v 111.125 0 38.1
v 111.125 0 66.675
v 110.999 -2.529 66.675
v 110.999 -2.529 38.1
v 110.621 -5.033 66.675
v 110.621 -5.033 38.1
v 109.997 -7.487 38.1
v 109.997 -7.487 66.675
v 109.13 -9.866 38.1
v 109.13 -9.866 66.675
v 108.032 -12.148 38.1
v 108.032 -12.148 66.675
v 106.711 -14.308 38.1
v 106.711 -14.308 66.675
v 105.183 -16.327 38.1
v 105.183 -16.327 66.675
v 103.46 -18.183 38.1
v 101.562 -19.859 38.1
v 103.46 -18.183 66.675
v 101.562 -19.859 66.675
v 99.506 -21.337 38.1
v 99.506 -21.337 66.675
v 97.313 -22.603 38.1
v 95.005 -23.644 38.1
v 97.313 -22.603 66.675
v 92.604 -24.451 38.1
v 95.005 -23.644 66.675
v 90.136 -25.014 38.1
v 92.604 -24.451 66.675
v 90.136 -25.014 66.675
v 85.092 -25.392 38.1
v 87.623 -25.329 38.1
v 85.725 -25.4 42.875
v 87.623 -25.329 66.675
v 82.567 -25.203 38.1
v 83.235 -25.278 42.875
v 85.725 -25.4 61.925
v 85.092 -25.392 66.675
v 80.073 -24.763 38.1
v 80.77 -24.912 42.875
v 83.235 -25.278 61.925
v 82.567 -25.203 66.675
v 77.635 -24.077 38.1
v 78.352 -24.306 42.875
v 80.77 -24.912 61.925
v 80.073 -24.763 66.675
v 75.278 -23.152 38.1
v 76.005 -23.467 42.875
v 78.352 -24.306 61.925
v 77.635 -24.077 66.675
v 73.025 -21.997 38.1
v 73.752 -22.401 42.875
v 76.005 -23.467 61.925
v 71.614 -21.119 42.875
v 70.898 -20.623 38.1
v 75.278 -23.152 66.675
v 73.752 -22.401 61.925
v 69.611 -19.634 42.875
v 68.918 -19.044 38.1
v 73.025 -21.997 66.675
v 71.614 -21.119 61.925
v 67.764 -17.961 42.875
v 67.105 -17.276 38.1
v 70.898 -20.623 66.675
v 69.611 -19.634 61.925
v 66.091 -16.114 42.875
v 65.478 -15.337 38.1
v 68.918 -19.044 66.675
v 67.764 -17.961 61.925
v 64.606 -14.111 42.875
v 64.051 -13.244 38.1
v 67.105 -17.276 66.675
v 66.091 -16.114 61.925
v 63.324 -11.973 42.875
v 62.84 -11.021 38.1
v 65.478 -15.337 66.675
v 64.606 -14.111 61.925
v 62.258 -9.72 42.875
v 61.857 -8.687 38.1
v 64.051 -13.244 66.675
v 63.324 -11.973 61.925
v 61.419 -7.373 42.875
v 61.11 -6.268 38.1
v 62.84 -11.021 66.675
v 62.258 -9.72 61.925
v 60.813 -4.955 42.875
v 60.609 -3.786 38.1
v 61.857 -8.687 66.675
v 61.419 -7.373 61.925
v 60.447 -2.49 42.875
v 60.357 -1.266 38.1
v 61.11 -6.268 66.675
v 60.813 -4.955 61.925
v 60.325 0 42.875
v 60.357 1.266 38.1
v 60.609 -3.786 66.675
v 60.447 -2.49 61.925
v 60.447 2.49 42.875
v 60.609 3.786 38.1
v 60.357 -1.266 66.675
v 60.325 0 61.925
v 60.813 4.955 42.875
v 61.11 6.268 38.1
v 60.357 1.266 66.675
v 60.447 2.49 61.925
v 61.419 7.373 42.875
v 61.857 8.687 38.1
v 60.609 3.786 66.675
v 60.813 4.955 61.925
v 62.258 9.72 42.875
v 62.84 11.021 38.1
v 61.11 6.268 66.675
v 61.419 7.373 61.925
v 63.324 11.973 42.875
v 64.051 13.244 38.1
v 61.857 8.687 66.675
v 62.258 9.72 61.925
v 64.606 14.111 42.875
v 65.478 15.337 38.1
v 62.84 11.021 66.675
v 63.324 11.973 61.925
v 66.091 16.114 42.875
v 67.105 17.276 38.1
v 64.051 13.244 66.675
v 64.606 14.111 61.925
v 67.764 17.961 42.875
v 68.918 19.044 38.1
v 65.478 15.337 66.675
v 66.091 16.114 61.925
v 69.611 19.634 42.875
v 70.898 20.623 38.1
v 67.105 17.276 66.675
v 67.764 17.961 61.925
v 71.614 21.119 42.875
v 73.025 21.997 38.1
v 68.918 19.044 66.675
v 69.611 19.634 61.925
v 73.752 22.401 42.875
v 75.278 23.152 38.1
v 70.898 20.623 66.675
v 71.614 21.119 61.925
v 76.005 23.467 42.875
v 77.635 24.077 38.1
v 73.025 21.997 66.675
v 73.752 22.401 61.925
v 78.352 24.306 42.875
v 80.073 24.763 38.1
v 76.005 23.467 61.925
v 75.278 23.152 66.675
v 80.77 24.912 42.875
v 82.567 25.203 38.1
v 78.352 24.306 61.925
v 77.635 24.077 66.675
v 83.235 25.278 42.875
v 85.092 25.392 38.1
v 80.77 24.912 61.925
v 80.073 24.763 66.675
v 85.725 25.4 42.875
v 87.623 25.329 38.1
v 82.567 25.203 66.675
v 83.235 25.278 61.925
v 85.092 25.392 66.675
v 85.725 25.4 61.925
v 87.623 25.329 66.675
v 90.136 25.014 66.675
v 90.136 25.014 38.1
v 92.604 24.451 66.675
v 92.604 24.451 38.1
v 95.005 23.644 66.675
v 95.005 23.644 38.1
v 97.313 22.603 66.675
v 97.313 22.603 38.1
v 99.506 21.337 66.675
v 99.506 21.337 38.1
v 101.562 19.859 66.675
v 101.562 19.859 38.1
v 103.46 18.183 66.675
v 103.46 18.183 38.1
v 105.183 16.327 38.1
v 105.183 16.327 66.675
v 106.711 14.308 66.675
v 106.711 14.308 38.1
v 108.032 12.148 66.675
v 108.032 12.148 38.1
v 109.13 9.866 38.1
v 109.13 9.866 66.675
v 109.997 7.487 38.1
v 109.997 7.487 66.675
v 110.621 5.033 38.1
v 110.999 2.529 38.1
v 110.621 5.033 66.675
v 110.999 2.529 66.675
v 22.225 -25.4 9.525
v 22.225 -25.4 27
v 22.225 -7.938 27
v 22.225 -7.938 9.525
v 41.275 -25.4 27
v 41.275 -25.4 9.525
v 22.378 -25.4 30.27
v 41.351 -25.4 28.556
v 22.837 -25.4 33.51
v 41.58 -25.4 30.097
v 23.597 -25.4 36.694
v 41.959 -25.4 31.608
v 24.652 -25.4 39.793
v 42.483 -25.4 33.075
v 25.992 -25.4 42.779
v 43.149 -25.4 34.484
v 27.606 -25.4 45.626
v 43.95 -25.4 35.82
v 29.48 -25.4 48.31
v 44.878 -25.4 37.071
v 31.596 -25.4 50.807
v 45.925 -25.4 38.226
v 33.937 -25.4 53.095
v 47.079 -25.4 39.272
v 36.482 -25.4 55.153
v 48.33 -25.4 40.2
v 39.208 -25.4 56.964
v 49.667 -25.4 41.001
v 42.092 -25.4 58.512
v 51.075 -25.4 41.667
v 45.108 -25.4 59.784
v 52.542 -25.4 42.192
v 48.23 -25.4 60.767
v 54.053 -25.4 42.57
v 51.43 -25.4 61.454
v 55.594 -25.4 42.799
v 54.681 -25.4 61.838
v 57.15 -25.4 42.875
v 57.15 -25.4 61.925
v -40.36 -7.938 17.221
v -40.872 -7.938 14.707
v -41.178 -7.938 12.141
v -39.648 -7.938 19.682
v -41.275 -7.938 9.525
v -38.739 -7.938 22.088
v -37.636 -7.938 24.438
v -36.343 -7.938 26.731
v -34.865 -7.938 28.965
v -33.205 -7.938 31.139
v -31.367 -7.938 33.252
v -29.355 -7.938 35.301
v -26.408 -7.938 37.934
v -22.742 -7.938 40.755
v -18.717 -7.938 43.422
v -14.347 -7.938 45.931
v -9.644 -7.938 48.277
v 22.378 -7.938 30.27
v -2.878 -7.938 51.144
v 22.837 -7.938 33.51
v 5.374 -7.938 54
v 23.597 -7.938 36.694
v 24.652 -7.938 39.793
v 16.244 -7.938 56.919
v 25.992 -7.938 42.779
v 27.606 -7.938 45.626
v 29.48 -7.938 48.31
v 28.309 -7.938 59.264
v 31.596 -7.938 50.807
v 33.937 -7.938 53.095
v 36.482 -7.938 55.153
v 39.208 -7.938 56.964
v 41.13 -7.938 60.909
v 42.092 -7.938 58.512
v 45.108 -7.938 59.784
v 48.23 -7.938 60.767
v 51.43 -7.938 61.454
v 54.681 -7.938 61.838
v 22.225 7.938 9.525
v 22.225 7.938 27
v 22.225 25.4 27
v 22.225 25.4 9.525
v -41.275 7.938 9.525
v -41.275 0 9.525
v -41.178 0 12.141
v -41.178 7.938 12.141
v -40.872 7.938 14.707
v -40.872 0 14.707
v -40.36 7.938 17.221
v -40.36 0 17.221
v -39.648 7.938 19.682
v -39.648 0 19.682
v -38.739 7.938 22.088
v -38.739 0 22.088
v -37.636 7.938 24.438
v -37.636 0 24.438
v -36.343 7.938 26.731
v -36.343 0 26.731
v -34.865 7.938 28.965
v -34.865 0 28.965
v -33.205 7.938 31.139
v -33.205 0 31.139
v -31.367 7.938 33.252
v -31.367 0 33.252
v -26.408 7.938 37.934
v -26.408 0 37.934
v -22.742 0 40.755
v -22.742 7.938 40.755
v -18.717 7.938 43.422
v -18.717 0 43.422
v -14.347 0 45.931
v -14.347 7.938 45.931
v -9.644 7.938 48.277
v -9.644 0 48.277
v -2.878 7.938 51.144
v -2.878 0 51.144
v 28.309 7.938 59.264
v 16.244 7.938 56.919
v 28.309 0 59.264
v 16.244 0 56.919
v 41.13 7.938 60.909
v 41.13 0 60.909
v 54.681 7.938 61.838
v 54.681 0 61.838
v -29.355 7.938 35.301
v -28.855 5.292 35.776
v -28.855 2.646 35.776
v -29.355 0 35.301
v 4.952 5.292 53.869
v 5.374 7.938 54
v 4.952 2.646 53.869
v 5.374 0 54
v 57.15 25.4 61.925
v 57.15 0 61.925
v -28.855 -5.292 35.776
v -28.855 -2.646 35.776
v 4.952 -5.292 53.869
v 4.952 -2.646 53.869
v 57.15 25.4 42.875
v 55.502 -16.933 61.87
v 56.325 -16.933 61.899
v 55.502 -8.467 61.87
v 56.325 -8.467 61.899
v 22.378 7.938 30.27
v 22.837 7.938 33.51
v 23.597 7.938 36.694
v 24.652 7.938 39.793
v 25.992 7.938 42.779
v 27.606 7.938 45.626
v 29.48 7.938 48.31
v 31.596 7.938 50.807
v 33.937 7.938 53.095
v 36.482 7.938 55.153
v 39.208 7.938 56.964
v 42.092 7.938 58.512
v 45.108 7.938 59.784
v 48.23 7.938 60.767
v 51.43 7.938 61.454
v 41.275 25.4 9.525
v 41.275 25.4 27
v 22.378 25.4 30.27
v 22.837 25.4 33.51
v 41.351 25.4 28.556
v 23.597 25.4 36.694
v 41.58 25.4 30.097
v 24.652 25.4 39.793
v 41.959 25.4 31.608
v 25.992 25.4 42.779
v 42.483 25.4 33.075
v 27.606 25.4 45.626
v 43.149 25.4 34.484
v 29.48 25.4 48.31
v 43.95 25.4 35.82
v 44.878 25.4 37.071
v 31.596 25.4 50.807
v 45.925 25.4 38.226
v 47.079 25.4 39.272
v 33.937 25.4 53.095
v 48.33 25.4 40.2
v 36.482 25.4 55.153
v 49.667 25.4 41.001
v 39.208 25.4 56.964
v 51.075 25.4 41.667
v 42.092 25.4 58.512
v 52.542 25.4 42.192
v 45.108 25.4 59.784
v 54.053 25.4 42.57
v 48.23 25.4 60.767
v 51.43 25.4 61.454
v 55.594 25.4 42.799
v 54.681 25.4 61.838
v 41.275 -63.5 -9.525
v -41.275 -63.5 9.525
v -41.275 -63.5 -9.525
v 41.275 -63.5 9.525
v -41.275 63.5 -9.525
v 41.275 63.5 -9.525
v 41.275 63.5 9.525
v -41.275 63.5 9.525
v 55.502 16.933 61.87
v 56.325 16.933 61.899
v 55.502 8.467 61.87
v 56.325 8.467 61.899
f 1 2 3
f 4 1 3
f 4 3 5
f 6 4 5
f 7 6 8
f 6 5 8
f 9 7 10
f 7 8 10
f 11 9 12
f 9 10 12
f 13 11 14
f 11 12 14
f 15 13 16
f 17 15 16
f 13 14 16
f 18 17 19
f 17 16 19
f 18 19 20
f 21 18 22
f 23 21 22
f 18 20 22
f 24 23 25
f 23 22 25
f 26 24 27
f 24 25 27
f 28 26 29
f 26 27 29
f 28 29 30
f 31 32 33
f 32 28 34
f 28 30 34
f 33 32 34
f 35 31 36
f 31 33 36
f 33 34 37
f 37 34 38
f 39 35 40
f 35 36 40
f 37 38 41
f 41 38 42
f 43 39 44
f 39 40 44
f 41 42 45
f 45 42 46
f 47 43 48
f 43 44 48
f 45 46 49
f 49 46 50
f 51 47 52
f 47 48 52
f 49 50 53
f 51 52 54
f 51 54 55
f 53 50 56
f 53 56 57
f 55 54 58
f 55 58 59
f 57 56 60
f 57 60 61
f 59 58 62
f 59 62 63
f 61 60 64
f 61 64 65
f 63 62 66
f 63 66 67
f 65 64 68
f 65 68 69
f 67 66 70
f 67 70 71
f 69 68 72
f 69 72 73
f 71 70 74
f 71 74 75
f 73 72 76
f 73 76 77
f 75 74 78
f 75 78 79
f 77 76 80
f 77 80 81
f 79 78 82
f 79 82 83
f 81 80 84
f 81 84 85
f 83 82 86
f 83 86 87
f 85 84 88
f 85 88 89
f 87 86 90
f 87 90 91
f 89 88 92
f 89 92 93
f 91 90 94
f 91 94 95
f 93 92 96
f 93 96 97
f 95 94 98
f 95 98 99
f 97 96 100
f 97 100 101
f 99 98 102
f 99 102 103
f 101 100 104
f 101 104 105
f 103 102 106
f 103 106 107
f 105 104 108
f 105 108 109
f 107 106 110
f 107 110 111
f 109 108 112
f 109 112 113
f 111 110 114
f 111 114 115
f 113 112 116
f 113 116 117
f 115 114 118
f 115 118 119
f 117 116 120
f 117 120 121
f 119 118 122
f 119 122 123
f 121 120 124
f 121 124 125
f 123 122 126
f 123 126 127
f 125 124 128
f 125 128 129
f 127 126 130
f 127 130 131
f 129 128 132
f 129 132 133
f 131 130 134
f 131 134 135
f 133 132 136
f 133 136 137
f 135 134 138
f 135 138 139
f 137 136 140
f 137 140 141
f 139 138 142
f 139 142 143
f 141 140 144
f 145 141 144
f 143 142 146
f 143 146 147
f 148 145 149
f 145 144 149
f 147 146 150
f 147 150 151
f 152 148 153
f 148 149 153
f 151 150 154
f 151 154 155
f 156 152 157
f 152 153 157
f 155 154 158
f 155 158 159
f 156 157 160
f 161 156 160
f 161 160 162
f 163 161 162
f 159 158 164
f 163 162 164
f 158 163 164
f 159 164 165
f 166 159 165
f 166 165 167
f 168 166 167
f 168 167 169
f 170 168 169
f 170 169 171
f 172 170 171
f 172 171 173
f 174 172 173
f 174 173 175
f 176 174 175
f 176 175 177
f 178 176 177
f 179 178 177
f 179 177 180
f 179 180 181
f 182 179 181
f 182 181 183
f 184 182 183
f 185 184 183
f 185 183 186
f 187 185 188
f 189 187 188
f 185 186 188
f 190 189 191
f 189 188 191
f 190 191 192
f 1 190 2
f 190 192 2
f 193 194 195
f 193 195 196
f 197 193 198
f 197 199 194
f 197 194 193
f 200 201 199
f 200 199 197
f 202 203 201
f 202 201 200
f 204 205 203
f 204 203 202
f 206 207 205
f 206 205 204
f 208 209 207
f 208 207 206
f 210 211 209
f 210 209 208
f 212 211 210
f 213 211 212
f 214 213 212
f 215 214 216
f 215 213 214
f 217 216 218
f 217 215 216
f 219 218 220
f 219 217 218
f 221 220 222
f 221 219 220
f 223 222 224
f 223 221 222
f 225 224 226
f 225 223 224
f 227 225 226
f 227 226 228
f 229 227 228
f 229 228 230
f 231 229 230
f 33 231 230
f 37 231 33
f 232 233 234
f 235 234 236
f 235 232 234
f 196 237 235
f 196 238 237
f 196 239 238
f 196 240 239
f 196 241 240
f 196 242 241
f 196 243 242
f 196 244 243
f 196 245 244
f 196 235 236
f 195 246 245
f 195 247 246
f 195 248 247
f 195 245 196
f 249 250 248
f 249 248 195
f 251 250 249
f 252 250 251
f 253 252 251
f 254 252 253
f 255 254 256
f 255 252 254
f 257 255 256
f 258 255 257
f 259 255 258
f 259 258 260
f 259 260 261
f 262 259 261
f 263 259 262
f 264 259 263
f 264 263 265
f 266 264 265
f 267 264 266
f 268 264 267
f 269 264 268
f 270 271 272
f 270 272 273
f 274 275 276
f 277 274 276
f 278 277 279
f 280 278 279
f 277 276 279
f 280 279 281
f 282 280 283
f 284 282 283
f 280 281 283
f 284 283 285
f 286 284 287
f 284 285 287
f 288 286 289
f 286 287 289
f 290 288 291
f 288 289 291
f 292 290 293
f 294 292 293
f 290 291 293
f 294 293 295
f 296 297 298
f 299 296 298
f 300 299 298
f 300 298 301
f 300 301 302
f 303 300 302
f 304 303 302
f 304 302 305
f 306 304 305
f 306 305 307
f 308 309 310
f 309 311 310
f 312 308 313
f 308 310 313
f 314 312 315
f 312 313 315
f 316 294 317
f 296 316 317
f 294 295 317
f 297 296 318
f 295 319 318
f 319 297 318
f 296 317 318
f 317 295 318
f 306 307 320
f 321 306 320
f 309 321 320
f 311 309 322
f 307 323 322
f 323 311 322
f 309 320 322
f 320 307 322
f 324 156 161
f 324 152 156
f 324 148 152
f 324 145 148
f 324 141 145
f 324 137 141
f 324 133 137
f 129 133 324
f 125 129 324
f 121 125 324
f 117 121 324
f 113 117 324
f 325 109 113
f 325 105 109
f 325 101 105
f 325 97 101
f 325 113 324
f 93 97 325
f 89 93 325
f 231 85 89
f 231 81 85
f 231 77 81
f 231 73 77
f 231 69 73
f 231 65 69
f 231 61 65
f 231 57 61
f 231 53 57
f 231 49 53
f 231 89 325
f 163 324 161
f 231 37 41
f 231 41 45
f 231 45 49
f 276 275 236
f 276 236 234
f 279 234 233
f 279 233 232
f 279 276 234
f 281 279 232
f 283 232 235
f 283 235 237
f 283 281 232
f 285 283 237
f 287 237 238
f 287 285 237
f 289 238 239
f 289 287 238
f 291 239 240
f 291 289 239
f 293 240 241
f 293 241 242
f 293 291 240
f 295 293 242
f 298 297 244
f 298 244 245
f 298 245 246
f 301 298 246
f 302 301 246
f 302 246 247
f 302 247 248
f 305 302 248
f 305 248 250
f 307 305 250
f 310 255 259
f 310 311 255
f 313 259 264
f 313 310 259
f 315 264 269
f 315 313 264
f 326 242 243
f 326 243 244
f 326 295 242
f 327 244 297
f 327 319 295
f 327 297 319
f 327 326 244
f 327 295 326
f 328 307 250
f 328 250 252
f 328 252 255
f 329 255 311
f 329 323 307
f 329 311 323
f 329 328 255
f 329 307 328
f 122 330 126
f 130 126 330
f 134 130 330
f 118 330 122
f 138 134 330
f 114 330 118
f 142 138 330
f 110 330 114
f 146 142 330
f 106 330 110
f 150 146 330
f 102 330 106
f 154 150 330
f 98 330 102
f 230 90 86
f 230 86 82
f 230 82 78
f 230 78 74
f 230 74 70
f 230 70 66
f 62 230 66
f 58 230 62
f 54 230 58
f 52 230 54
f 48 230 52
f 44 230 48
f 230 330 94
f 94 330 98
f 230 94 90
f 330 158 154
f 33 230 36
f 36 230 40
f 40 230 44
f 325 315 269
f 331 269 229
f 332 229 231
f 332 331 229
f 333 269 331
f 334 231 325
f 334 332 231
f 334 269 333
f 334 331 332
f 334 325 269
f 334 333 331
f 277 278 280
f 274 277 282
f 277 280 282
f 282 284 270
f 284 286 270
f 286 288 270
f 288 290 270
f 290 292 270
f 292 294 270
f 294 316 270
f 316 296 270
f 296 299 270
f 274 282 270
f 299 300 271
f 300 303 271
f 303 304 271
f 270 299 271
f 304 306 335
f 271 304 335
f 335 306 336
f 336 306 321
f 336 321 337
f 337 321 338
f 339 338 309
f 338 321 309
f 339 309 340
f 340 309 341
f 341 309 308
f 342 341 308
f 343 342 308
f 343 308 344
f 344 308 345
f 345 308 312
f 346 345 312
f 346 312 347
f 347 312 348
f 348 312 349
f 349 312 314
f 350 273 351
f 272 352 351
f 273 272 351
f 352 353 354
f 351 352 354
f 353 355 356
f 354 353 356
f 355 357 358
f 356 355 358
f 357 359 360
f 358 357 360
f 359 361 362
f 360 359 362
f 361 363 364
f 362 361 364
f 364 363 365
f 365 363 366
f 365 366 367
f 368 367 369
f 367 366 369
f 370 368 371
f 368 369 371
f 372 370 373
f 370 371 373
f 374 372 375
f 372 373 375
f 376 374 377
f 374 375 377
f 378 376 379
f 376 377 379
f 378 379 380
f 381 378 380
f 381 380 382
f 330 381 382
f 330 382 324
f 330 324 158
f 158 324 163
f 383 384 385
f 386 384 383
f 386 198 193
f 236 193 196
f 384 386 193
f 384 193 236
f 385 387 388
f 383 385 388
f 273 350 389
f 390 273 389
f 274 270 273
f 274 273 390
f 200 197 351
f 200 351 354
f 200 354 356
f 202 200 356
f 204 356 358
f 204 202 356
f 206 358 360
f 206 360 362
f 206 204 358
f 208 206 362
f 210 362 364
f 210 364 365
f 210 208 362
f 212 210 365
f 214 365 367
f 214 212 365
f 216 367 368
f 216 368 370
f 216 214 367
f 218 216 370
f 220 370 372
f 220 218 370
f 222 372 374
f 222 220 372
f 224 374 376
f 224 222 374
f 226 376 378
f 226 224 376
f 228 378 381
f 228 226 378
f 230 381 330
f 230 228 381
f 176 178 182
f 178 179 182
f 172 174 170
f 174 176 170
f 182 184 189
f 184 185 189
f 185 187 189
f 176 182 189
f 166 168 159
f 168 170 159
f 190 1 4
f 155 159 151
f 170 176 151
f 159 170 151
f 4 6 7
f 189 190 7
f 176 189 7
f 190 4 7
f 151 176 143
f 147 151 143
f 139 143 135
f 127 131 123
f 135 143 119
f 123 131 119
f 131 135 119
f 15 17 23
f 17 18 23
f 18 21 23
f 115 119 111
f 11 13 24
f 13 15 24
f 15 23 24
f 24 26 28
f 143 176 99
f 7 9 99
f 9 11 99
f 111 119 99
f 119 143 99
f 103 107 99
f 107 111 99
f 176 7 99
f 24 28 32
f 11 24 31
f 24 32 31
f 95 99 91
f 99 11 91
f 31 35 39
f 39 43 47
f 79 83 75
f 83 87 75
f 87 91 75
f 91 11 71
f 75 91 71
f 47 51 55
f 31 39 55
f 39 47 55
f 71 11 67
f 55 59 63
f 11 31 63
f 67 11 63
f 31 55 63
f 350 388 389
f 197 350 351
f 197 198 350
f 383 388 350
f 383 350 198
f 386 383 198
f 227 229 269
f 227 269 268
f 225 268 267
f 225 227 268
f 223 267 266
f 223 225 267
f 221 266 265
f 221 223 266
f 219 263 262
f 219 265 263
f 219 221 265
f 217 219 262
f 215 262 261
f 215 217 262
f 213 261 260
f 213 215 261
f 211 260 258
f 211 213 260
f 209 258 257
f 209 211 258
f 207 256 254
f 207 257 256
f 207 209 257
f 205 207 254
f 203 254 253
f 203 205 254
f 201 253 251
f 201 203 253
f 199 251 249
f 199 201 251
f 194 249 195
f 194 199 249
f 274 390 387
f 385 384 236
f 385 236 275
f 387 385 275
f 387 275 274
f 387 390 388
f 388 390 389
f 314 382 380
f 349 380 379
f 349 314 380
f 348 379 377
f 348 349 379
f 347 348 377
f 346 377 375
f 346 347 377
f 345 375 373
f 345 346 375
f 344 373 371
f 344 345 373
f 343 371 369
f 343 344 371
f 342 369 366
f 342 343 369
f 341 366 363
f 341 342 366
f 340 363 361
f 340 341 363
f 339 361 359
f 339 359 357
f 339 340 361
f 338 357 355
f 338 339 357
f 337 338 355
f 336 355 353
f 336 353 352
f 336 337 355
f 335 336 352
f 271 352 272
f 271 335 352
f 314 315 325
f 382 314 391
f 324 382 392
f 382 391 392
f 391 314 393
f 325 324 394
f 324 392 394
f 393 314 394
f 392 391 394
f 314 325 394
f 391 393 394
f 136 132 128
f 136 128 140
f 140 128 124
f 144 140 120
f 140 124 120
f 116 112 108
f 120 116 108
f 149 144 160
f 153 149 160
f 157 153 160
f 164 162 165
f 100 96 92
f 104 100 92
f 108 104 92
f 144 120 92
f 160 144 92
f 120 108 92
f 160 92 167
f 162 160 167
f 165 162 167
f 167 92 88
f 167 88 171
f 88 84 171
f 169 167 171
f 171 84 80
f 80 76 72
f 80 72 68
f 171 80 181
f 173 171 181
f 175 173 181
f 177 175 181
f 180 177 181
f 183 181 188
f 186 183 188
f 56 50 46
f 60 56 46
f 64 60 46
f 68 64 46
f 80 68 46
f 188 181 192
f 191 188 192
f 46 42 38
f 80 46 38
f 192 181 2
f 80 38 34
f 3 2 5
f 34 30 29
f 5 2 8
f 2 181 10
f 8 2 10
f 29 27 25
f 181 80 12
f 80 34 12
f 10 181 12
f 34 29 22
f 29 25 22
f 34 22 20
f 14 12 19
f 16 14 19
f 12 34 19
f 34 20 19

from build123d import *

# Parameters (mm, degrees)
F1_DEPTH = 63.5
F0_W     = 25.4
F0_H     = 19.05
F2_DEPTH = 25.4
F3_DEPTH = 7.9375


with BuildPart() as f1:
    # F0 (on Front) → F1 (new body, symmetric)
    with BuildSketch(Plane.XZ):
        Polygon((41.275, -9.525), (41.275, 9.525), (22.225, 9.525), (-41.275, 9.525), (-41.275, -9.525), align=None)
    extrude(amount=F1_DEPTH, both=True)

    # F0 (on Front) → F2 (join, symmetric)
    with BuildSketch(Plane.XZ):
        with BuildLine():
            Line((22.225, 9.525), (41.275, 9.525))
            Line((41.275, 9.525), (41.275, 27.0002))
            ThreePointArc((41.275, 27.0002), (45.9246798487, 38.2255201513), (57.15, 42.8752))
            Line((57.15, 42.8752), (60.325, 42.8752))
            Line((60.325, 42.8752), (60.325, 61.9252))
            Line((60.325, 61.9252), (57.15, 61.9252))
            add(Edge.make_bspline(
                [(54.6808253359, 61.8378061387), (55.500532419, 61.870850227), (56.3236165266, 61.8999908241), (57.15, 61.9252)],
                knots=[109.8921913534, 109.8921913534, 109.8921913534, 109.8921913534, 111.5045361635, 111.5045361635, 111.5045361635, 111.5045361635], degree=3))
            ThreePointArc((54.6808253359, 61.8378061387), (31.5962179889, 50.806918588), (22.225, 27.0002))
            Line((22.225, 27.0002), (22.225, 9.525))
        make_face()
        with Locations((73.025, 52.4002)):
            Rectangle(F0_W, F0_H)
    extrude(amount=F2_DEPTH, both=True)

    # F0 (on Front) → F3 (join, symmetric)
    with BuildSketch(Plane.XZ):
        with BuildLine():
            Line((-41.275, 9.525), (22.225, 9.525))
            Line((22.225, 9.525), (22.225, 27.0002))
            ThreePointArc((22.225, 27.0002), (31.5962179889, 50.806918588), (54.6808253359, 61.8378061387))
            add(Edge.make_bspline(
                [(-41.275, 9.525), (-41.3688876605, 39.2003932287), (-1.1877500898, 59.5856282852), (54.6808253359, 61.8378061387)],
                knots=[0, 0, 0, 0, 109.8921913534, 109.8921913534, 109.8921913534, 109.8921913534], degree=3))
        make_face()
    extrude(amount=F3_DEPTH, both=True)

    # F0 (on Front) → F4 (revolve)
    with BuildSketch(Plane.XZ):
        Polygon((85.725, 61.9252), (85.725, 42.8752), (85.725, 38.1), (111.125, 38.1), (111.125, 66.675), (85.725, 66.675), align=None)
    revolve(axis=Axis((85.725, 0, 52.3875), (0, 0, -1)))


solid = f1.part
